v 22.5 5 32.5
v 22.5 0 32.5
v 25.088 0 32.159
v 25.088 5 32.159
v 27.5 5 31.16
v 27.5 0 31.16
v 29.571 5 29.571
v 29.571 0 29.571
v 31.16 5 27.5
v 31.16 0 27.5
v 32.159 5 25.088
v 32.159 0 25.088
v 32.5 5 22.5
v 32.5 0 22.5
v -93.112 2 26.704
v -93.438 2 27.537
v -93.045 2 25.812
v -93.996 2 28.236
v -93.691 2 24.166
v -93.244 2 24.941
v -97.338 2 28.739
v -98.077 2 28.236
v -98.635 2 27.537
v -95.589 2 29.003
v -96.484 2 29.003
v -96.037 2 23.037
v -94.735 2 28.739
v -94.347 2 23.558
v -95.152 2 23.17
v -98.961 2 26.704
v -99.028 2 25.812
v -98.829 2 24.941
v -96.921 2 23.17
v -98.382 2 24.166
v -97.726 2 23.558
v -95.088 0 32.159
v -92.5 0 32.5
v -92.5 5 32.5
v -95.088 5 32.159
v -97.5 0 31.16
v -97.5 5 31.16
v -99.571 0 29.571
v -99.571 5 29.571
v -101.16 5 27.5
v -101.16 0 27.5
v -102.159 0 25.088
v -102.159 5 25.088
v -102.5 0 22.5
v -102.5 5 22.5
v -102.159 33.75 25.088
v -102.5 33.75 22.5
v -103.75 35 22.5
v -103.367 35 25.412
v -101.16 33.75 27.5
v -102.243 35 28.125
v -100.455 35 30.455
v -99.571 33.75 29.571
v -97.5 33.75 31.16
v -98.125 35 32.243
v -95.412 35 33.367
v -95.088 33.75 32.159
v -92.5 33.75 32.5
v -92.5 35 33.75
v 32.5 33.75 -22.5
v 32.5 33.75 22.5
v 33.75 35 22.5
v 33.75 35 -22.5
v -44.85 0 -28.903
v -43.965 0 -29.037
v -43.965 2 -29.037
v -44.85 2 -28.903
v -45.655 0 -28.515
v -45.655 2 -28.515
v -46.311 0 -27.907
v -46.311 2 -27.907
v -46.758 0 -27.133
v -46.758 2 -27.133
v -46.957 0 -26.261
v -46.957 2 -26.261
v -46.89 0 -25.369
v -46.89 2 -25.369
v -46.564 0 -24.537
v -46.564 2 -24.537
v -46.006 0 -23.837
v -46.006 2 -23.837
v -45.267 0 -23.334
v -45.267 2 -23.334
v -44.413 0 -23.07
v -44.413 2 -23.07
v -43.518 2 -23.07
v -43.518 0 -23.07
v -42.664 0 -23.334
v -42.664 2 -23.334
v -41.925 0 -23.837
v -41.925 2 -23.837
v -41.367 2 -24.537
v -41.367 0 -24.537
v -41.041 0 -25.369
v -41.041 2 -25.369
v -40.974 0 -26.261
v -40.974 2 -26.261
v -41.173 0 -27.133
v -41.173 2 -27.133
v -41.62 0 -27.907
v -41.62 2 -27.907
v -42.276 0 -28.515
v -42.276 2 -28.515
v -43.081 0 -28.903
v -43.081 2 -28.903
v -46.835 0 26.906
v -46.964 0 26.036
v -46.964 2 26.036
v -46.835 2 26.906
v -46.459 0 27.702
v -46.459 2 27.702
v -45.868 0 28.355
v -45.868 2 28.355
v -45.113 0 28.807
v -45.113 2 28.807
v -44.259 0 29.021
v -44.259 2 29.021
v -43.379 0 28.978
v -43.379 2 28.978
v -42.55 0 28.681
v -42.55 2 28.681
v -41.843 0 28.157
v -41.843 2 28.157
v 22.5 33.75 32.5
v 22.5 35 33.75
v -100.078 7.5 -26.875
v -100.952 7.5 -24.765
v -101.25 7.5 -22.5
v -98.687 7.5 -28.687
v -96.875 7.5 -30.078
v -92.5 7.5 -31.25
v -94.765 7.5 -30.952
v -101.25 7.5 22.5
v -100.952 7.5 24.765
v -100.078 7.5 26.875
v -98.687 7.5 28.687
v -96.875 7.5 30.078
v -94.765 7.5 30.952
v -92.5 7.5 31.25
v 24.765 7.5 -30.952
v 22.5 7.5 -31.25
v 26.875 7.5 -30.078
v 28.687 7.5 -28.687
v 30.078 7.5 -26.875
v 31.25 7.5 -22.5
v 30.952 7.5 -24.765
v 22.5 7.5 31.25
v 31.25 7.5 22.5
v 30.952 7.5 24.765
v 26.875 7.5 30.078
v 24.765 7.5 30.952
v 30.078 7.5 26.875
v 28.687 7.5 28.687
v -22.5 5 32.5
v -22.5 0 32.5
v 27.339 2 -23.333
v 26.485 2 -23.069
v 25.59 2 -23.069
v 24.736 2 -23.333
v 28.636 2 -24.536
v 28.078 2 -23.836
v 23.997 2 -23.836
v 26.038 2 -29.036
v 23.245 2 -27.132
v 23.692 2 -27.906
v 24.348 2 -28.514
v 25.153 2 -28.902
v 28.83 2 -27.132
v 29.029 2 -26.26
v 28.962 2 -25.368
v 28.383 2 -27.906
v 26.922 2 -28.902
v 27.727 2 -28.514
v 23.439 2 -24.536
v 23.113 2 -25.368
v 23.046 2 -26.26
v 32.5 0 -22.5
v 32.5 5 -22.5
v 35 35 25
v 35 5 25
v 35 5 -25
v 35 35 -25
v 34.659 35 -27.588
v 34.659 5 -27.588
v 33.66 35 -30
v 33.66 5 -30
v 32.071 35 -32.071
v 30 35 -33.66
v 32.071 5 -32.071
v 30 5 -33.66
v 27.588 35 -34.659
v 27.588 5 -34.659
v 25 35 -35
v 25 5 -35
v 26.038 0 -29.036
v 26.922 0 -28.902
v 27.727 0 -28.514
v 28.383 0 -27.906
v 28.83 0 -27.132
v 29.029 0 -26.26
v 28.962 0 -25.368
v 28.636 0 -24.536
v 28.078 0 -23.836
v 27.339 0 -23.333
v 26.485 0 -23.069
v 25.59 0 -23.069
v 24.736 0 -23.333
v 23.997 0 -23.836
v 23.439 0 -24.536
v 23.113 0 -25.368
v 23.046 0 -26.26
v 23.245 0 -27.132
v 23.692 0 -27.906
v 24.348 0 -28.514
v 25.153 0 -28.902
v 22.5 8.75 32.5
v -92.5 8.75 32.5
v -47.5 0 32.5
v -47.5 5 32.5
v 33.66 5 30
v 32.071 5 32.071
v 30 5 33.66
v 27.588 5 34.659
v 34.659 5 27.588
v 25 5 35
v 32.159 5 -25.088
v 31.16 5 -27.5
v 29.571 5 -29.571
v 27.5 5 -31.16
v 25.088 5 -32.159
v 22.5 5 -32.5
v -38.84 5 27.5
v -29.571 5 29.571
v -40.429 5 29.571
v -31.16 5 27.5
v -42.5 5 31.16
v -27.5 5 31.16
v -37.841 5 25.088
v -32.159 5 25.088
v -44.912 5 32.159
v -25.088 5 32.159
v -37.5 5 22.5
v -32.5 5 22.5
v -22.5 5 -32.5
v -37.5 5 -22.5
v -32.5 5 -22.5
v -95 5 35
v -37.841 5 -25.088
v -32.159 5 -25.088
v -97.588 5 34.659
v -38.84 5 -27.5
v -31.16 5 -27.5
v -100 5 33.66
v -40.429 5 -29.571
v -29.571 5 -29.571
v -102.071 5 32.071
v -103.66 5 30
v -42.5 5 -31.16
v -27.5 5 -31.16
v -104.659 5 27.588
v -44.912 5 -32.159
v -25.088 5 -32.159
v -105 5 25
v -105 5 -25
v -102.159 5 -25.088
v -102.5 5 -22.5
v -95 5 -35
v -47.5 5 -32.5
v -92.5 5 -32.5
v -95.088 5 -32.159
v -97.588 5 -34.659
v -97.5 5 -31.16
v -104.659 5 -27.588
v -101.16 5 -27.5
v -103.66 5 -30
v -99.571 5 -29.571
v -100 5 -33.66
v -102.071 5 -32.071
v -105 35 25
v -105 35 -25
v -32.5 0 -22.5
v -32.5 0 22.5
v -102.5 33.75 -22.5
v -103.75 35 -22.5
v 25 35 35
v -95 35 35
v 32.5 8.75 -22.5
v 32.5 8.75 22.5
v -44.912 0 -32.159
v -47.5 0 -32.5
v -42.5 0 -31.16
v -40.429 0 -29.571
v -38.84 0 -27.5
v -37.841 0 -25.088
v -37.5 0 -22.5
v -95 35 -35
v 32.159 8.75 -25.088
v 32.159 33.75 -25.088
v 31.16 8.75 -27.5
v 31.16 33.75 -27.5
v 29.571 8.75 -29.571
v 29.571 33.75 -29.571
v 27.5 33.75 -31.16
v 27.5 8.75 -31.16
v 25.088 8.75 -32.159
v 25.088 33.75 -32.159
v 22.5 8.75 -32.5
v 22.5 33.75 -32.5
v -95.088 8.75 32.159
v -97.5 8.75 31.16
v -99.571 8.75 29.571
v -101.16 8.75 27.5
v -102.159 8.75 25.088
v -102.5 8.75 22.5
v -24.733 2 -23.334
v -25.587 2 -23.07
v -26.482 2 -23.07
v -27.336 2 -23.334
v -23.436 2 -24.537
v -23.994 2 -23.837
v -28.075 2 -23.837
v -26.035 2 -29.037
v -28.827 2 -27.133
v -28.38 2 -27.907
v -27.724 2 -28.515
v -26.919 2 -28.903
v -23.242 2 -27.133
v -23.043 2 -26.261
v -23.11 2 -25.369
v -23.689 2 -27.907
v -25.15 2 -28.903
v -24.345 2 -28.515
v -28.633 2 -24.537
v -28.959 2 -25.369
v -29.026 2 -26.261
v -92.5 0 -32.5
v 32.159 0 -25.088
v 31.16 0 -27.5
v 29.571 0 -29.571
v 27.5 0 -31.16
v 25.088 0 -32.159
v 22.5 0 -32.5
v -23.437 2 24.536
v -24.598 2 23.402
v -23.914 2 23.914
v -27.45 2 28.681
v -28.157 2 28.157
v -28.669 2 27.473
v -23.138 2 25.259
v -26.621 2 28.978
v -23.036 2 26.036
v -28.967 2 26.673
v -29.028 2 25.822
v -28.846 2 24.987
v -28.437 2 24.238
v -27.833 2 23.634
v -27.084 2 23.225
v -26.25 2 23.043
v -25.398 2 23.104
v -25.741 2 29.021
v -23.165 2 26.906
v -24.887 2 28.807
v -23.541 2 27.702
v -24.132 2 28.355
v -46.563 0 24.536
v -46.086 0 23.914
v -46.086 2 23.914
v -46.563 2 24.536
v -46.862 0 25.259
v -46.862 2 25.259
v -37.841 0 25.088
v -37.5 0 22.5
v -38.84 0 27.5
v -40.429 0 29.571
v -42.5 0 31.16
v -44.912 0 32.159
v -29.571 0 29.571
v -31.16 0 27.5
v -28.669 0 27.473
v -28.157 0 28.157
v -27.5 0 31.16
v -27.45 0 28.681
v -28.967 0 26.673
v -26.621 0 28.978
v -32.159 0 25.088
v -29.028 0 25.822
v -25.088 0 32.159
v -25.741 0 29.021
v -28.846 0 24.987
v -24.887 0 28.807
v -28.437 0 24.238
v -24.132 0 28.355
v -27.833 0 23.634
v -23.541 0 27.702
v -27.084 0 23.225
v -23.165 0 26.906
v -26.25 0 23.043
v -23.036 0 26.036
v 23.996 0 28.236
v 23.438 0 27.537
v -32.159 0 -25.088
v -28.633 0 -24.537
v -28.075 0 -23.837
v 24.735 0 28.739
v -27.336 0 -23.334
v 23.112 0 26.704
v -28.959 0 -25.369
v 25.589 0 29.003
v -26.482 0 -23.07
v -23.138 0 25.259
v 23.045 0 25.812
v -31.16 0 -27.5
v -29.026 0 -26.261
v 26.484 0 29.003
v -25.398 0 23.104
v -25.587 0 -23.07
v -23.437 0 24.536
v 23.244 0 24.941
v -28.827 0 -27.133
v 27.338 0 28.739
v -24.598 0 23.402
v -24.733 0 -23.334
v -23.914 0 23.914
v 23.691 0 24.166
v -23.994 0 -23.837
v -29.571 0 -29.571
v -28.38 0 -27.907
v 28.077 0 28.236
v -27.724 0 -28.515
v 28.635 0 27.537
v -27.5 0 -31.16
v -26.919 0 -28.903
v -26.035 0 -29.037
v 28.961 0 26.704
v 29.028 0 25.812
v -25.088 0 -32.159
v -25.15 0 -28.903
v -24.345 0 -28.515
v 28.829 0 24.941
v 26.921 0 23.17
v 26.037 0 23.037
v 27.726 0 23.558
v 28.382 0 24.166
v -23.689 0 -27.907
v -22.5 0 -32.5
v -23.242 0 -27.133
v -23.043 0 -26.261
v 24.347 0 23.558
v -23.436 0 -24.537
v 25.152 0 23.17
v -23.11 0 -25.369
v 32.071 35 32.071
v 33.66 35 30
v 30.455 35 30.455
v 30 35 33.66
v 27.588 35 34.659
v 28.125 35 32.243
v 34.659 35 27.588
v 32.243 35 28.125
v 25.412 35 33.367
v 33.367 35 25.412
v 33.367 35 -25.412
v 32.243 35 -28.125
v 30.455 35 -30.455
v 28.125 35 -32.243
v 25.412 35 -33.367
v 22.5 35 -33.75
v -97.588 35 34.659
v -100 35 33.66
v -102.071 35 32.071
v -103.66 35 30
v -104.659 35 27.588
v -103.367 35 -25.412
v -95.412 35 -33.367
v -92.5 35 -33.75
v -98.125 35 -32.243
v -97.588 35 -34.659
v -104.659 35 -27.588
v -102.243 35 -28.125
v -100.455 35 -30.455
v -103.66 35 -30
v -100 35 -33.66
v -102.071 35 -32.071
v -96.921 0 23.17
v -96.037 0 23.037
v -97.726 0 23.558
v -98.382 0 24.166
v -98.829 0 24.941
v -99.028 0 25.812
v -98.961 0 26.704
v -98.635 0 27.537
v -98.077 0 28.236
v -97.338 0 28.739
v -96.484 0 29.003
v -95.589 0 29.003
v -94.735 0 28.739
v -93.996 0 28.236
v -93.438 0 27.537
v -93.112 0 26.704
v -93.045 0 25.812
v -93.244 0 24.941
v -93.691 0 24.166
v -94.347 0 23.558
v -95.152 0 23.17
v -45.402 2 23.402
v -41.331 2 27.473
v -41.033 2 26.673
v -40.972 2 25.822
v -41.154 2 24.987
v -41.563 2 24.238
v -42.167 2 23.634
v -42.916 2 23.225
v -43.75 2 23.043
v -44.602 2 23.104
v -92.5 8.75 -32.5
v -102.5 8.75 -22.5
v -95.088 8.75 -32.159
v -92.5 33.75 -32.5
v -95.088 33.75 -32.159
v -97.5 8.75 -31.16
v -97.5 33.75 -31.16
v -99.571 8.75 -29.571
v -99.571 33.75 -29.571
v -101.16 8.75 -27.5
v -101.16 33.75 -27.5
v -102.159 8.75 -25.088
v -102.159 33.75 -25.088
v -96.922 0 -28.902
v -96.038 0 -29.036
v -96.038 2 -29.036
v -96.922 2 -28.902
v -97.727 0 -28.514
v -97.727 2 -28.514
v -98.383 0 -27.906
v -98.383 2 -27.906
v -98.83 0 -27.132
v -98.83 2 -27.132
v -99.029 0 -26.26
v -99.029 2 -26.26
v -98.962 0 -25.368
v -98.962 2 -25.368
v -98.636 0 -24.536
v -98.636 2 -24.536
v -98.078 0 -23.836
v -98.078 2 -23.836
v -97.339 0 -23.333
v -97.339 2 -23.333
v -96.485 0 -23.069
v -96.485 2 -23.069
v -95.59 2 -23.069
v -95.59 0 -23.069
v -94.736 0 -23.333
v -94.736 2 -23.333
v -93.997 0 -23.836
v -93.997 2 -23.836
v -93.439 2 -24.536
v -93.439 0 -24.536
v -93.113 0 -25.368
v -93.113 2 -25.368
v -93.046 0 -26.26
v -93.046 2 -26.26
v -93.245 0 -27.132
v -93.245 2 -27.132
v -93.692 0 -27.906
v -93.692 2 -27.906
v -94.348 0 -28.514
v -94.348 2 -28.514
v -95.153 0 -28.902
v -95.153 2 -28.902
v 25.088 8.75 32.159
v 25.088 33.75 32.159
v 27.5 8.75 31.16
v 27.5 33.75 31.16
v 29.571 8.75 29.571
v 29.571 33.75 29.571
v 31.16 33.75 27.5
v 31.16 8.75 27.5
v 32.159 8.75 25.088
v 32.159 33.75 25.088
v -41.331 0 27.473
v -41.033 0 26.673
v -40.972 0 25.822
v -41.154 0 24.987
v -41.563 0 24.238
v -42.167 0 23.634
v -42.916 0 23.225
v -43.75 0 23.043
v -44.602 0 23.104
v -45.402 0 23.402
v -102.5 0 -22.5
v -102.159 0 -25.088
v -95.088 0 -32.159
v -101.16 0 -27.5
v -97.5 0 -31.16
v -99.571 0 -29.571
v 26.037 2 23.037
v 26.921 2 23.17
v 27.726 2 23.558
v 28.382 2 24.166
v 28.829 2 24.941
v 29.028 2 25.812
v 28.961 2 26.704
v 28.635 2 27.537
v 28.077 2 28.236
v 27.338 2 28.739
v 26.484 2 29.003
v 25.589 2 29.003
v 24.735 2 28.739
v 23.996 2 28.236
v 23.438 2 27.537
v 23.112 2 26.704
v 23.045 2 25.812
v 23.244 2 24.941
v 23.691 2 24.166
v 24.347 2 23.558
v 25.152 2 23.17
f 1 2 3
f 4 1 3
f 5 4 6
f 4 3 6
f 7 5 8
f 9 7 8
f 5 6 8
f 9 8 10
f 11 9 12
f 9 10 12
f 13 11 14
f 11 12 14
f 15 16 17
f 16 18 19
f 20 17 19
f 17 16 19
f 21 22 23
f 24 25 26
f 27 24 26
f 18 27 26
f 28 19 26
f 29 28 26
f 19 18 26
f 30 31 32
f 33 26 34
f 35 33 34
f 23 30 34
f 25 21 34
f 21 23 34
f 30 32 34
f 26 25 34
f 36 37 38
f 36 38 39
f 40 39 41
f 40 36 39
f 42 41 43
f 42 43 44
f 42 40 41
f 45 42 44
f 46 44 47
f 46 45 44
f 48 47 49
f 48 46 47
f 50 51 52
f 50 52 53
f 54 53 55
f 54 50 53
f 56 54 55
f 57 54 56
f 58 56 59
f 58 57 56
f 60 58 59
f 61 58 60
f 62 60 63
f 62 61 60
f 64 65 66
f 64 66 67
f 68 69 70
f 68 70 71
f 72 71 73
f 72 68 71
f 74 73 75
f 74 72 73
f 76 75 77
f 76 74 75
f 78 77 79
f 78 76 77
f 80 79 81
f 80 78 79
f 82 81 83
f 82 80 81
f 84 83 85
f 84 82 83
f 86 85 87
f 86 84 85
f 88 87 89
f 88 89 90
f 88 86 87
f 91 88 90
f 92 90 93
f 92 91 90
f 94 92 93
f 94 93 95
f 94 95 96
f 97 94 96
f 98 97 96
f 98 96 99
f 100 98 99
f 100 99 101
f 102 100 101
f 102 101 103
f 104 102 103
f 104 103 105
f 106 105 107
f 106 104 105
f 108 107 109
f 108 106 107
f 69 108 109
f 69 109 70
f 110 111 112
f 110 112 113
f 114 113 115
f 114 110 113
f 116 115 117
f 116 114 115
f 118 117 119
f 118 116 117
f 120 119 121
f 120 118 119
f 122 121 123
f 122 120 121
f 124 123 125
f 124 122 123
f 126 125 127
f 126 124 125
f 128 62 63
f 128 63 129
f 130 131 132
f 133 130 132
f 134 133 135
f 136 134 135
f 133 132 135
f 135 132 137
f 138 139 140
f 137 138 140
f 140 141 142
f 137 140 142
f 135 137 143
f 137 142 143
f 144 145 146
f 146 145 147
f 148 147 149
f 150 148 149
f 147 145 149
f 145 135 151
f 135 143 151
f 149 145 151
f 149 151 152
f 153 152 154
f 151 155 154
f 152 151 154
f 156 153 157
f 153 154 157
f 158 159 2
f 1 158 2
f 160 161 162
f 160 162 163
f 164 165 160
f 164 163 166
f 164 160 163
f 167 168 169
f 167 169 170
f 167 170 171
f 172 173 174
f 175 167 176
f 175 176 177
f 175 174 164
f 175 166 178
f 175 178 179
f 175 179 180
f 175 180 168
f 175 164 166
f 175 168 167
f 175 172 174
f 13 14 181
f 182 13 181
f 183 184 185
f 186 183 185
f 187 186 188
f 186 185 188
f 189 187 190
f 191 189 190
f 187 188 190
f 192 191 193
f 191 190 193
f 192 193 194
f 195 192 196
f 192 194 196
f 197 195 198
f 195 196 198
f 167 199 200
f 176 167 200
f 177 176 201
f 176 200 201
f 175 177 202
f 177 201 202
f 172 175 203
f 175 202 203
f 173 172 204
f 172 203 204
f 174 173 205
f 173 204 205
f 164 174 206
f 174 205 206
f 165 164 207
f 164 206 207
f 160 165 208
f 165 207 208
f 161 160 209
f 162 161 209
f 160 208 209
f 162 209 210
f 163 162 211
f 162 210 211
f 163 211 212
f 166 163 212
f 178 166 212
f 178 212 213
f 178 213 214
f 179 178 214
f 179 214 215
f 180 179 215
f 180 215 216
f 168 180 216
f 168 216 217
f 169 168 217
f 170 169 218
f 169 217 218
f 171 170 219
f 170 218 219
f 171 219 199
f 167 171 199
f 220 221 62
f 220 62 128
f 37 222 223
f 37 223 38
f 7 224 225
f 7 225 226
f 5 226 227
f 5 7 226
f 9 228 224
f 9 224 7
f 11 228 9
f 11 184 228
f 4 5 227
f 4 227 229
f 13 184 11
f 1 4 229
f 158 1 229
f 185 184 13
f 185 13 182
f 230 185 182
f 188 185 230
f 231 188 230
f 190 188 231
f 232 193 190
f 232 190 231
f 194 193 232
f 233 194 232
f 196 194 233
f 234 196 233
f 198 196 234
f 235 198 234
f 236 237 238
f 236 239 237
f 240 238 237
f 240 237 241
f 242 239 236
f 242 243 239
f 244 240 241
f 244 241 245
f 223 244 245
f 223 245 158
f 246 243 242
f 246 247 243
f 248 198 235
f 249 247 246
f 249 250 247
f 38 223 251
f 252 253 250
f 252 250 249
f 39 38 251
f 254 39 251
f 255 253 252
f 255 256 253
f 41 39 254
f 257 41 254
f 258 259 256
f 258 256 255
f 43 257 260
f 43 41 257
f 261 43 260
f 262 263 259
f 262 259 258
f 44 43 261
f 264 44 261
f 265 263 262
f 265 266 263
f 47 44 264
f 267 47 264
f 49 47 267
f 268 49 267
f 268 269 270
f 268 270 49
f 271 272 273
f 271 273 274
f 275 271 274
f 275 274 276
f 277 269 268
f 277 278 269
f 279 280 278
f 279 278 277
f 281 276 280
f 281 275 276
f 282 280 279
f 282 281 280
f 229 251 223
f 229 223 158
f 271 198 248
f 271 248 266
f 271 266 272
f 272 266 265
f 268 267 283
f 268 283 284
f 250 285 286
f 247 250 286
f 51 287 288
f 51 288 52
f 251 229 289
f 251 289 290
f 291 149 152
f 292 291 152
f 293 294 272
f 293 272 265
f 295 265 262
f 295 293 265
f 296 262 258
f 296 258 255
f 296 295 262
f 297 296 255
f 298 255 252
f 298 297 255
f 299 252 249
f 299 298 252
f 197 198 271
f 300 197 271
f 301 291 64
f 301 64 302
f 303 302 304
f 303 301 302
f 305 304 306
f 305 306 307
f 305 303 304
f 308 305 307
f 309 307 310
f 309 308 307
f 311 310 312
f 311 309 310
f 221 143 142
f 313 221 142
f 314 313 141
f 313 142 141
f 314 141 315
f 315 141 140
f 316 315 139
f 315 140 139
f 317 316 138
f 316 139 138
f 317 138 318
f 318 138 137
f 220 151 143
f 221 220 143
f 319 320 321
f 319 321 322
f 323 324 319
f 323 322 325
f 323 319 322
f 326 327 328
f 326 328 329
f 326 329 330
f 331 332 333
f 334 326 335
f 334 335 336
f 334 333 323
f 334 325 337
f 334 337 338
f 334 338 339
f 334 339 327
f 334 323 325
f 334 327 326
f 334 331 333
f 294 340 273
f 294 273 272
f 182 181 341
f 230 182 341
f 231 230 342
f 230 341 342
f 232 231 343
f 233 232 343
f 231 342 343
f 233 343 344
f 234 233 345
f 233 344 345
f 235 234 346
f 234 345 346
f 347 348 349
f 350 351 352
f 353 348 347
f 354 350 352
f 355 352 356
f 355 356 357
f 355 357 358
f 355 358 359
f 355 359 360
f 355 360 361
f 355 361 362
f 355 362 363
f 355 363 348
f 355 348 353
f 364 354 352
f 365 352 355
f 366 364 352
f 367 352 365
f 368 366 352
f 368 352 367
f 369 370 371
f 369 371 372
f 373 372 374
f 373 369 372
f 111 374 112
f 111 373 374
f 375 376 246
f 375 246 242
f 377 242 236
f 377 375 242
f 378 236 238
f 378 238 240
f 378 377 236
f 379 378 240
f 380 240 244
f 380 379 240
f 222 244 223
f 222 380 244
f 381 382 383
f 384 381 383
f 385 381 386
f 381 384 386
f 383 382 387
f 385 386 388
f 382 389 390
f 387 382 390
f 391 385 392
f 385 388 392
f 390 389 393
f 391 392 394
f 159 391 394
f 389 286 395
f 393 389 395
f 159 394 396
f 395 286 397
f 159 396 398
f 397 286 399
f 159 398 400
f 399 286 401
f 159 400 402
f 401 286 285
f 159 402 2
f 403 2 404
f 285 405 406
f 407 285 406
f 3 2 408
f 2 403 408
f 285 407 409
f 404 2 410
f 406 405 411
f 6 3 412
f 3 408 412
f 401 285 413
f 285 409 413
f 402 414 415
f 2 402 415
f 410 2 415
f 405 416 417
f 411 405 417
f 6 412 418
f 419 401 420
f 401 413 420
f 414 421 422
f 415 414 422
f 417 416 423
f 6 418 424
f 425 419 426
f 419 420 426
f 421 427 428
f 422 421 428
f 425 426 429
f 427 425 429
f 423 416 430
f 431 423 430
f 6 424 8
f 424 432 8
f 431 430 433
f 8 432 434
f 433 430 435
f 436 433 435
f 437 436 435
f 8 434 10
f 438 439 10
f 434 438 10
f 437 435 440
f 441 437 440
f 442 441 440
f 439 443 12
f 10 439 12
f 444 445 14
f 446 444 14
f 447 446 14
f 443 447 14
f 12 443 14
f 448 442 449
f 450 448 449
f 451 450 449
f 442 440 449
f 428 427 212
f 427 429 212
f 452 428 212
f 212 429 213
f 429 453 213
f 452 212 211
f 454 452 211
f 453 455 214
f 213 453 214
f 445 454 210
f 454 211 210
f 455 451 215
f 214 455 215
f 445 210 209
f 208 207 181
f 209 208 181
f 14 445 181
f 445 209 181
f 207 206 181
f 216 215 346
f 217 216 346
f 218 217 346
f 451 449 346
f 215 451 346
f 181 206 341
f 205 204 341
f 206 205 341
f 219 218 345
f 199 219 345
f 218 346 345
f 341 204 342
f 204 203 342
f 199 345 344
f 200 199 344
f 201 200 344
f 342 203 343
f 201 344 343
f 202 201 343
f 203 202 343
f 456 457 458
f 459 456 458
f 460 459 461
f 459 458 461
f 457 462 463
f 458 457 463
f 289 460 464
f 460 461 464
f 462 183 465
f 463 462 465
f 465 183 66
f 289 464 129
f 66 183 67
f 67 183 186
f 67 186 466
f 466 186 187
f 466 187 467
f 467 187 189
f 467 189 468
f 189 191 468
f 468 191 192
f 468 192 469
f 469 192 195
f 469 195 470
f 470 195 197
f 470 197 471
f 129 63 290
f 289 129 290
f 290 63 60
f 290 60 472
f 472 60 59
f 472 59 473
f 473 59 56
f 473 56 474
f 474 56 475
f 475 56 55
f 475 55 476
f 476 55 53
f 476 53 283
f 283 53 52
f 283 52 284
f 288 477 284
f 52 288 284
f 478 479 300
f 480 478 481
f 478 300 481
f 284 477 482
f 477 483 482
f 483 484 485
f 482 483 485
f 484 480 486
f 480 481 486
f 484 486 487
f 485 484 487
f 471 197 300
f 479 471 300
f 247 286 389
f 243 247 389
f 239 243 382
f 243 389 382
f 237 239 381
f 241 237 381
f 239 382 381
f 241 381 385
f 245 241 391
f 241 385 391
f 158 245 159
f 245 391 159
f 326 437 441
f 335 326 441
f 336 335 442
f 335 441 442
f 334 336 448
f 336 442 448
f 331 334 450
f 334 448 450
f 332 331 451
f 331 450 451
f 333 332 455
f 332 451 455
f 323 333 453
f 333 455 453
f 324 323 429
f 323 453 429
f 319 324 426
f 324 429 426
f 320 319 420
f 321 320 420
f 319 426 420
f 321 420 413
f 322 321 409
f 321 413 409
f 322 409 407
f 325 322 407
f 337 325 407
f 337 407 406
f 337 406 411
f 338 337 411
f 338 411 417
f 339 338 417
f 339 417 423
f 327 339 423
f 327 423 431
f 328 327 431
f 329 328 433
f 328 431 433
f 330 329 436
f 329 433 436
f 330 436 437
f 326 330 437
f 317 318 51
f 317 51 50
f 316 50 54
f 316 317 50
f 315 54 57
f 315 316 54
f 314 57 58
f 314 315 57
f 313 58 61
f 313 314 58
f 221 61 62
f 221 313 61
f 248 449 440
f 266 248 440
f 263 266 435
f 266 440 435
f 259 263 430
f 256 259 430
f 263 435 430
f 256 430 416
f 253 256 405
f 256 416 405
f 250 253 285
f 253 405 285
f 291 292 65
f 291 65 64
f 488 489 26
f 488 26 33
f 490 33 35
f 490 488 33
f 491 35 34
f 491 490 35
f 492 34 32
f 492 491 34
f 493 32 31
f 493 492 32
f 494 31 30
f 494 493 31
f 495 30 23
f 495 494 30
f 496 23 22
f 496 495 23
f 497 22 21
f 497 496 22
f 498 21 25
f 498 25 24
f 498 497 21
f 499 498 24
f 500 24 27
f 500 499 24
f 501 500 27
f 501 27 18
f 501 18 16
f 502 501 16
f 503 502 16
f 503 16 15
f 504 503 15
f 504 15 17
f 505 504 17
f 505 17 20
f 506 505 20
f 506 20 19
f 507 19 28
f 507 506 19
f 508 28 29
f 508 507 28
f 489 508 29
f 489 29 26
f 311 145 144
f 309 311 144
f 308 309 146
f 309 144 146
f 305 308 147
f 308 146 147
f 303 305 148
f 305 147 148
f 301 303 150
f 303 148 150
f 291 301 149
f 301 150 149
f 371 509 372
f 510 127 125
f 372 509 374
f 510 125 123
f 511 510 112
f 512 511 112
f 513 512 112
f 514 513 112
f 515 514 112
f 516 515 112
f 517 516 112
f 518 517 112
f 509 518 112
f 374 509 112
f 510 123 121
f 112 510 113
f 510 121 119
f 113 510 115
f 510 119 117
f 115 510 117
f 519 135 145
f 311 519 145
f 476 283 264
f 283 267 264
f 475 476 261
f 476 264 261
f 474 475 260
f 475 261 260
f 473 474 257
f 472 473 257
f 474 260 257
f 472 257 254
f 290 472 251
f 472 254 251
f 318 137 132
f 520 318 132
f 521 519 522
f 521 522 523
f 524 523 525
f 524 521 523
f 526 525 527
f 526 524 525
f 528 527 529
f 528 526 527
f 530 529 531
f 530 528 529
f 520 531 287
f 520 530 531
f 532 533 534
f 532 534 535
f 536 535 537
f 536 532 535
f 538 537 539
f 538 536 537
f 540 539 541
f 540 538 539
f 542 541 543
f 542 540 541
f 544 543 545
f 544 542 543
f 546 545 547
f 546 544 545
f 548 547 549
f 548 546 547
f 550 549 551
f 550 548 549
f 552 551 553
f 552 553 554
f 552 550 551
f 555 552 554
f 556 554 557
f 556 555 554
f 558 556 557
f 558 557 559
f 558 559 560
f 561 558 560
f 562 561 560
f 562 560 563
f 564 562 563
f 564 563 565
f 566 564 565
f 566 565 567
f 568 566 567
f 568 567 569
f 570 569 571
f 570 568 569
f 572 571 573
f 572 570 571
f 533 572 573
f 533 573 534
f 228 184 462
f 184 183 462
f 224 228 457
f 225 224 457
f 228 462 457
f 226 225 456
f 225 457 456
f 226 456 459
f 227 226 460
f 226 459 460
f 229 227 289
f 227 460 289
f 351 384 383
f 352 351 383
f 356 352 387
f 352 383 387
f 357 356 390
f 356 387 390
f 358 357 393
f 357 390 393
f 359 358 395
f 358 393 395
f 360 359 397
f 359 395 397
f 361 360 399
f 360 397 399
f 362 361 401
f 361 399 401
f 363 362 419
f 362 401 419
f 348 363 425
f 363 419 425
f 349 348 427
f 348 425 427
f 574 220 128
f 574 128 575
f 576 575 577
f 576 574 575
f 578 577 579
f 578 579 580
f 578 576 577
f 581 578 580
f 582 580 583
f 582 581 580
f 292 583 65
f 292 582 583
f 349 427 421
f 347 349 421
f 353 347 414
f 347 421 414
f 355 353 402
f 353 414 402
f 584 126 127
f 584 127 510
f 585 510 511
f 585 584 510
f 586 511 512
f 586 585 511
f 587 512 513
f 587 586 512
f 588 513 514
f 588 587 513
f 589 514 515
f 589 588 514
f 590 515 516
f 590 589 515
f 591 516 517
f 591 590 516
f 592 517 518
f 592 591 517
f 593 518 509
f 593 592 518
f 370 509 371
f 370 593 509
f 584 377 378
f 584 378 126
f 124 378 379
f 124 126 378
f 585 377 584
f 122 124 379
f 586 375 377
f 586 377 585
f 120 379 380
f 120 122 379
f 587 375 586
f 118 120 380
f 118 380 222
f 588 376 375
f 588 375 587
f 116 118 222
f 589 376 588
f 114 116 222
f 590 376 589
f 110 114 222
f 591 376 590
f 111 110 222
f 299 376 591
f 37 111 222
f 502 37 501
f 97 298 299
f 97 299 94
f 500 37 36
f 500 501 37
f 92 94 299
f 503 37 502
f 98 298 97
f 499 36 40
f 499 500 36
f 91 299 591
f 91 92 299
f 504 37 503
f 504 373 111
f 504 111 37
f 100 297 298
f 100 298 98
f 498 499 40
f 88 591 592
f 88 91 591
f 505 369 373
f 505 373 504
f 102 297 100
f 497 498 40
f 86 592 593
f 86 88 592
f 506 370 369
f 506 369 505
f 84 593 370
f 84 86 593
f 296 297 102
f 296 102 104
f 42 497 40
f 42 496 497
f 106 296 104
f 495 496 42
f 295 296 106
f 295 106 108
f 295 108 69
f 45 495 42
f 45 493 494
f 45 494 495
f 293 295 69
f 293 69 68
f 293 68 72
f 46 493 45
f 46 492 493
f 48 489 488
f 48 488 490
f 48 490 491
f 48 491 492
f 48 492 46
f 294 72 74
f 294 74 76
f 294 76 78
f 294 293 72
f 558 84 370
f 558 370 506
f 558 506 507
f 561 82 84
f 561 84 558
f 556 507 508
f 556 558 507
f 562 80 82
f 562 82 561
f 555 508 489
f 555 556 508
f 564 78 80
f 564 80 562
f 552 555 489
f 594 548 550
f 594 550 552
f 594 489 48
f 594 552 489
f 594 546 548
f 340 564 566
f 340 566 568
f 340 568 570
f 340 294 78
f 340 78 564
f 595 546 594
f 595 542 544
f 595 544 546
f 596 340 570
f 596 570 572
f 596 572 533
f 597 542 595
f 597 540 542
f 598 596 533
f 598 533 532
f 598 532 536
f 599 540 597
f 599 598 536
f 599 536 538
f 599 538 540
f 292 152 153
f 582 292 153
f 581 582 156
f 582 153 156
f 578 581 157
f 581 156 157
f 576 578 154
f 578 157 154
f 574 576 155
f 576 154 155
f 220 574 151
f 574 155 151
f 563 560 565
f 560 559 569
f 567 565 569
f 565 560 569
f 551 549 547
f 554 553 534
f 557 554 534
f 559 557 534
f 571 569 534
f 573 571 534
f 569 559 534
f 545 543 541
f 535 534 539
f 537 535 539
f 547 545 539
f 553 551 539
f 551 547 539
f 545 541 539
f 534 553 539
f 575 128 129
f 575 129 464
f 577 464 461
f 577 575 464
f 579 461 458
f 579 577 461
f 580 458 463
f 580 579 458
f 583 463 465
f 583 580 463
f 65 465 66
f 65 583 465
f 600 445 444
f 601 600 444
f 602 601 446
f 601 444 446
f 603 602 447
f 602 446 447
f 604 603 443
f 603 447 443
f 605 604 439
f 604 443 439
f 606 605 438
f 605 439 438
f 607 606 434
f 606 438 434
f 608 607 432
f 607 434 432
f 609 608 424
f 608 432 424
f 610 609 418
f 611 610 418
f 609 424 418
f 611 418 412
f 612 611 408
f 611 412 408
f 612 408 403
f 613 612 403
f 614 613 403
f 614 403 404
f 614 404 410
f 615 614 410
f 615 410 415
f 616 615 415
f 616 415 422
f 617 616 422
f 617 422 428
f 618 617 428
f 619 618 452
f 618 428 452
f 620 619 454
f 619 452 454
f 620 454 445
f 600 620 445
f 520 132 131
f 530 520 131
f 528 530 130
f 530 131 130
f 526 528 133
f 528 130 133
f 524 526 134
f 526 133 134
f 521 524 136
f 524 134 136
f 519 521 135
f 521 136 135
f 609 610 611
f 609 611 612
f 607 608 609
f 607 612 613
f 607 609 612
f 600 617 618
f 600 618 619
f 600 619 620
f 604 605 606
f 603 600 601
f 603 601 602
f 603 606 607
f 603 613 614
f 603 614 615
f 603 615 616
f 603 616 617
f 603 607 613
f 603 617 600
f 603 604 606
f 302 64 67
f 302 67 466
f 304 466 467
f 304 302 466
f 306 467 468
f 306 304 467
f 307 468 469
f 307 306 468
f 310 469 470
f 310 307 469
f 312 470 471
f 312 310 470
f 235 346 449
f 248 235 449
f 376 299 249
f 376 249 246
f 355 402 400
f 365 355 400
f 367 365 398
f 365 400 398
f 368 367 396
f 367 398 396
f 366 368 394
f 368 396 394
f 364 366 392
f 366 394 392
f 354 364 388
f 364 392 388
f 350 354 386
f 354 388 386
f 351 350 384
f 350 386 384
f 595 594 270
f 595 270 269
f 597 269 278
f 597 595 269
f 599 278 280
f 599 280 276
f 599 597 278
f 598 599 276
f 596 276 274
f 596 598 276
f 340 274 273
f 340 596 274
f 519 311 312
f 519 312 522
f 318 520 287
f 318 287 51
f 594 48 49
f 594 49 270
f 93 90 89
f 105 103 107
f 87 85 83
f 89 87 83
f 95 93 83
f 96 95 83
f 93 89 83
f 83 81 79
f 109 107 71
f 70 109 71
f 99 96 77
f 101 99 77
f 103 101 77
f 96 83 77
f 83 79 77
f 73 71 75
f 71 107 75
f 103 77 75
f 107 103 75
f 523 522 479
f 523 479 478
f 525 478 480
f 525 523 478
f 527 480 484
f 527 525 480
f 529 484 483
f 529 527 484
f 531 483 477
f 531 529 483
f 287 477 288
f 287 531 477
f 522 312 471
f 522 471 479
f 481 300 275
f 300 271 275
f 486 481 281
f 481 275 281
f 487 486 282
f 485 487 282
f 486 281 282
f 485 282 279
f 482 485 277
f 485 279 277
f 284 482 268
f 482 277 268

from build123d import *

# Parameters (mm, degrees)
BOSS_EXTRUDE4_DEPTH = 5
SKETCH6_W           = 70
SKETCH6_H           = 70
BOSS_EXTRUDE5_DEPTH = 30
SKETCH8_R           = 3
CUT_EXTRUDE1_DEPTH  = 2
CUT_EXTRUDE2_START  = -30
CUT_EXTRUDE2_DEPTH  = 30
SKETCH10_W          = 140
SKETCH10_H          = 70
BOSS_EXTRUDE6_DEPTH = 2.5
FILLET1_R           = 10
CHAMFER1_SIZE       = 1.25
CHAMFER2_SIZE       = 1.25


with BuildPart() as part:
    # Sketch5 → Boss-Extrude4 (new body)
    with BuildSketch(Plane(origin=(0, 0, 0), x_dir=(1, 0, 0), z_dir=(0, 1, 0))):
        with BuildLine():
            Line((-22.5, -32.5), (22.5, -32.5))
            ThreePointArc((22.5, -32.5), (29.571067812, -29.571067812), (32.5, -22.5))
            Line((32.5, -22.5), (32.5, 22.5))
            ThreePointArc((32.5, 22.5), (29.571067812, 29.571067812), (22.5, 32.5))
            Line((22.5, 32.5), (-22.5, 32.5))
            ThreePointArc((-22.5, 32.5), (-29.571067812, 29.571067812), (-32.5, 22.5))
            Line((-32.5, 22.5), (-32.5, -22.5))
            ThreePointArc((-32.5, -22.5), (-29.571067812, -29.571067812), (-22.5, -32.5))
        make_face()
    extrude(amount=BOSS_EXTRUDE4_DEPTH)

    # Sketch6 → Boss-Extrude5 (add)
    with BuildSketch(Plane(origin=(0, 5, 0), x_dir=(1, 0, 0), z_dir=(0, 1, 0))):
        Rectangle(SKETCH6_W, SKETCH6_H)
    extrude(amount=BOSS_EXTRUDE5_DEPTH)

    # Sketch8 → Cut-Extrude1 (cut)
    with BuildSketch(Plane.XZ):
        with Locations(Location((26.037533906, -26.035533906, 0), (0, 0, 270))):
            Circle(SKETCH8_R)
        with Locations(Location((26.036533906, 26.036533906, 0), (0, 0, 270))):
            Circle(SKETCH8_R)
        with BuildLine():
            ThreePointArc((-23.035533906, 26.035533906), (-24.887483609, 28.807172503), (-28.156854249, 28.156854249))
            Line((-28.156854249, 28.156854249), (-23.914213562, 23.914213562))
            ThreePointArc((-23.914213562, 23.914213562), (-23.263895308, 24.887483609), (-23.035533906, 26.035533906))
        make_face()
        with BuildLine():
            Line((-23.914213562, 23.914213562), (-28.156854249, 28.156854249))
            ThreePointArc((-28.156854249, 28.156854249), (-28.156854249, 23.914213562), (-23.914213562, 23.914213562))
        make_face()
        with Locations(Location((-26.034533906, -26.036533906, 0), (0, 0, 270))):
            Circle(SKETCH8_R)
    extrude(amount=-CUT_EXTRUDE1_DEPTH, mode=Mode.SUBTRACT)

    # Mirror1: part across plane


with BuildPart() as part_1:
    add(part.part)
    add(part.part.mirror(Plane(origin=(-35, 35, -35), x_dir=(0, 0, 1), z_dir=(1, 0, 0))))

    # Sketch9 → Cut-Extrude2 (cut)
    with BuildSketch(Plane(origin=(0, 35, 0), x_dir=(1, 0, 0), z_dir=(0, 1, 0)).offset(CUT_EXTRUDE2_START)):
        with BuildLine():
            Line((22.5, 32.5), (-92.5, 32.5))
            ThreePointArc((-92.5, 32.5), (-99.571067812, 29.571067812), (-102.5, 22.5))
            Line((-102.5, 22.5), (-102.5, -22.5))
            ThreePointArc((-102.5, -22.5), (-99.571067812, -29.571067812), (-92.5, -32.5))
            Line((-92.5, -32.5), (22.5, -32.5))
            ThreePointArc((22.5, -32.5), (29.571067812, -29.571067812), (32.5, -22.5))
            Line((32.5, -22.5), (32.5, 22.5))
            ThreePointArc((32.5, 22.5), (29.571067812, 29.571067812), (22.5, 32.5))
        make_face()
    extrude(amount=CUT_EXTRUDE2_DEPTH, mode=Mode.SUBTRACT)


with BuildPart() as cut_extrude2_piece_1:
    # of the separate pieces the step leaves, piece 1, a body of its own (cut_extrude2_pieces)
    add(part_1.part.solids().sort_by_distance((35, 5, -35))[0])



with BuildPart() as cut_extrude2_piece_2:
    # of the separate pieces the step leaves, piece 2, a body of its own (cut_extrude2_pieces)
    add(part_1.part.solids().sort_by_distance((-22.5, 0, 32.5))[0])


with BuildPart() as cut_extrude2_piece_3:
    # of the separate pieces the step leaves, piece 3, a body of its own (cut_extrude2_pieces)
    add(part_1.part.solids().sort_by_distance((-92.5, 0, -32.5))[0])


with BuildPart() as cut_extrude2_piece_1_1:
    add(cut_extrude2_piece_1.part)

    add(cut_extrude2_piece_2.part)  # Boss-Extrude6 merges Cut-Extrude2 piece 2

    add(cut_extrude2_piece_3.part)  # Boss-Extrude6 merges Cut-Extrude2 piece 3
    # Sketch10 → Boss-Extrude6 (add)
    with BuildSketch(Plane.XZ.offset(-5)):
        with Locations((-35, 0)):
            Rectangle(SKETCH10_W, SKETCH10_H)
    extrude(amount=-BOSS_EXTRUDE6_DEPTH)

    # Fillet1
    fillet1_edges = [cut_extrude2_piece_1_1.edges().sort_by_distance(p)[0] for p in [
        (35, 20, 35),
        (35, 20, -35),
        (-105, 20, 35),
        (-105, 20, -35),
    ]]
    fillet(fillet1_edges, radius=FILLET1_R)

    # Chamfer1
    chamfer1_edges = [cut_extrude2_piece_1_1.edges().sort_by_distance(p)[0] for p in [
        (29.571067812, 7.5, -29.571067812),
        (-35, 7.5, -32.5),
        (-99.571067812, 7.5, -29.571067812),
        (-102.5, 7.5, 0),
        (-99.571067812, 7.5, 29.571067812),
        (-35, 7.5, 32.5),
        (29.571067812, 7.5, 29.571067812),
        (32.5, 7.5, 0),
    ]]
    chamfer(chamfer1_edges, length=CHAMFER1_SIZE)

    # Chamfer2
    chamfer2_edges = [cut_extrude2_piece_1_1.edges().sort_by_distance(p)[0] for p in [
        (-99.571067812, 35, 29.571067812),
        (-35, 35, 32.5),
        (29.571067812, 35, 29.571067812),
        (32.5, 35, 0),
        (29.571067812, 35, -29.571067812),
        (-35, 35, -32.5),
        (-99.571067812, 35, -29.571067812),
        (-102.5, 35, 0),
    ]]
    chamfer(chamfer2_edges, length=CHAMFER2_SIZE)


solid = cut_extrude2_piece_1_1.part
